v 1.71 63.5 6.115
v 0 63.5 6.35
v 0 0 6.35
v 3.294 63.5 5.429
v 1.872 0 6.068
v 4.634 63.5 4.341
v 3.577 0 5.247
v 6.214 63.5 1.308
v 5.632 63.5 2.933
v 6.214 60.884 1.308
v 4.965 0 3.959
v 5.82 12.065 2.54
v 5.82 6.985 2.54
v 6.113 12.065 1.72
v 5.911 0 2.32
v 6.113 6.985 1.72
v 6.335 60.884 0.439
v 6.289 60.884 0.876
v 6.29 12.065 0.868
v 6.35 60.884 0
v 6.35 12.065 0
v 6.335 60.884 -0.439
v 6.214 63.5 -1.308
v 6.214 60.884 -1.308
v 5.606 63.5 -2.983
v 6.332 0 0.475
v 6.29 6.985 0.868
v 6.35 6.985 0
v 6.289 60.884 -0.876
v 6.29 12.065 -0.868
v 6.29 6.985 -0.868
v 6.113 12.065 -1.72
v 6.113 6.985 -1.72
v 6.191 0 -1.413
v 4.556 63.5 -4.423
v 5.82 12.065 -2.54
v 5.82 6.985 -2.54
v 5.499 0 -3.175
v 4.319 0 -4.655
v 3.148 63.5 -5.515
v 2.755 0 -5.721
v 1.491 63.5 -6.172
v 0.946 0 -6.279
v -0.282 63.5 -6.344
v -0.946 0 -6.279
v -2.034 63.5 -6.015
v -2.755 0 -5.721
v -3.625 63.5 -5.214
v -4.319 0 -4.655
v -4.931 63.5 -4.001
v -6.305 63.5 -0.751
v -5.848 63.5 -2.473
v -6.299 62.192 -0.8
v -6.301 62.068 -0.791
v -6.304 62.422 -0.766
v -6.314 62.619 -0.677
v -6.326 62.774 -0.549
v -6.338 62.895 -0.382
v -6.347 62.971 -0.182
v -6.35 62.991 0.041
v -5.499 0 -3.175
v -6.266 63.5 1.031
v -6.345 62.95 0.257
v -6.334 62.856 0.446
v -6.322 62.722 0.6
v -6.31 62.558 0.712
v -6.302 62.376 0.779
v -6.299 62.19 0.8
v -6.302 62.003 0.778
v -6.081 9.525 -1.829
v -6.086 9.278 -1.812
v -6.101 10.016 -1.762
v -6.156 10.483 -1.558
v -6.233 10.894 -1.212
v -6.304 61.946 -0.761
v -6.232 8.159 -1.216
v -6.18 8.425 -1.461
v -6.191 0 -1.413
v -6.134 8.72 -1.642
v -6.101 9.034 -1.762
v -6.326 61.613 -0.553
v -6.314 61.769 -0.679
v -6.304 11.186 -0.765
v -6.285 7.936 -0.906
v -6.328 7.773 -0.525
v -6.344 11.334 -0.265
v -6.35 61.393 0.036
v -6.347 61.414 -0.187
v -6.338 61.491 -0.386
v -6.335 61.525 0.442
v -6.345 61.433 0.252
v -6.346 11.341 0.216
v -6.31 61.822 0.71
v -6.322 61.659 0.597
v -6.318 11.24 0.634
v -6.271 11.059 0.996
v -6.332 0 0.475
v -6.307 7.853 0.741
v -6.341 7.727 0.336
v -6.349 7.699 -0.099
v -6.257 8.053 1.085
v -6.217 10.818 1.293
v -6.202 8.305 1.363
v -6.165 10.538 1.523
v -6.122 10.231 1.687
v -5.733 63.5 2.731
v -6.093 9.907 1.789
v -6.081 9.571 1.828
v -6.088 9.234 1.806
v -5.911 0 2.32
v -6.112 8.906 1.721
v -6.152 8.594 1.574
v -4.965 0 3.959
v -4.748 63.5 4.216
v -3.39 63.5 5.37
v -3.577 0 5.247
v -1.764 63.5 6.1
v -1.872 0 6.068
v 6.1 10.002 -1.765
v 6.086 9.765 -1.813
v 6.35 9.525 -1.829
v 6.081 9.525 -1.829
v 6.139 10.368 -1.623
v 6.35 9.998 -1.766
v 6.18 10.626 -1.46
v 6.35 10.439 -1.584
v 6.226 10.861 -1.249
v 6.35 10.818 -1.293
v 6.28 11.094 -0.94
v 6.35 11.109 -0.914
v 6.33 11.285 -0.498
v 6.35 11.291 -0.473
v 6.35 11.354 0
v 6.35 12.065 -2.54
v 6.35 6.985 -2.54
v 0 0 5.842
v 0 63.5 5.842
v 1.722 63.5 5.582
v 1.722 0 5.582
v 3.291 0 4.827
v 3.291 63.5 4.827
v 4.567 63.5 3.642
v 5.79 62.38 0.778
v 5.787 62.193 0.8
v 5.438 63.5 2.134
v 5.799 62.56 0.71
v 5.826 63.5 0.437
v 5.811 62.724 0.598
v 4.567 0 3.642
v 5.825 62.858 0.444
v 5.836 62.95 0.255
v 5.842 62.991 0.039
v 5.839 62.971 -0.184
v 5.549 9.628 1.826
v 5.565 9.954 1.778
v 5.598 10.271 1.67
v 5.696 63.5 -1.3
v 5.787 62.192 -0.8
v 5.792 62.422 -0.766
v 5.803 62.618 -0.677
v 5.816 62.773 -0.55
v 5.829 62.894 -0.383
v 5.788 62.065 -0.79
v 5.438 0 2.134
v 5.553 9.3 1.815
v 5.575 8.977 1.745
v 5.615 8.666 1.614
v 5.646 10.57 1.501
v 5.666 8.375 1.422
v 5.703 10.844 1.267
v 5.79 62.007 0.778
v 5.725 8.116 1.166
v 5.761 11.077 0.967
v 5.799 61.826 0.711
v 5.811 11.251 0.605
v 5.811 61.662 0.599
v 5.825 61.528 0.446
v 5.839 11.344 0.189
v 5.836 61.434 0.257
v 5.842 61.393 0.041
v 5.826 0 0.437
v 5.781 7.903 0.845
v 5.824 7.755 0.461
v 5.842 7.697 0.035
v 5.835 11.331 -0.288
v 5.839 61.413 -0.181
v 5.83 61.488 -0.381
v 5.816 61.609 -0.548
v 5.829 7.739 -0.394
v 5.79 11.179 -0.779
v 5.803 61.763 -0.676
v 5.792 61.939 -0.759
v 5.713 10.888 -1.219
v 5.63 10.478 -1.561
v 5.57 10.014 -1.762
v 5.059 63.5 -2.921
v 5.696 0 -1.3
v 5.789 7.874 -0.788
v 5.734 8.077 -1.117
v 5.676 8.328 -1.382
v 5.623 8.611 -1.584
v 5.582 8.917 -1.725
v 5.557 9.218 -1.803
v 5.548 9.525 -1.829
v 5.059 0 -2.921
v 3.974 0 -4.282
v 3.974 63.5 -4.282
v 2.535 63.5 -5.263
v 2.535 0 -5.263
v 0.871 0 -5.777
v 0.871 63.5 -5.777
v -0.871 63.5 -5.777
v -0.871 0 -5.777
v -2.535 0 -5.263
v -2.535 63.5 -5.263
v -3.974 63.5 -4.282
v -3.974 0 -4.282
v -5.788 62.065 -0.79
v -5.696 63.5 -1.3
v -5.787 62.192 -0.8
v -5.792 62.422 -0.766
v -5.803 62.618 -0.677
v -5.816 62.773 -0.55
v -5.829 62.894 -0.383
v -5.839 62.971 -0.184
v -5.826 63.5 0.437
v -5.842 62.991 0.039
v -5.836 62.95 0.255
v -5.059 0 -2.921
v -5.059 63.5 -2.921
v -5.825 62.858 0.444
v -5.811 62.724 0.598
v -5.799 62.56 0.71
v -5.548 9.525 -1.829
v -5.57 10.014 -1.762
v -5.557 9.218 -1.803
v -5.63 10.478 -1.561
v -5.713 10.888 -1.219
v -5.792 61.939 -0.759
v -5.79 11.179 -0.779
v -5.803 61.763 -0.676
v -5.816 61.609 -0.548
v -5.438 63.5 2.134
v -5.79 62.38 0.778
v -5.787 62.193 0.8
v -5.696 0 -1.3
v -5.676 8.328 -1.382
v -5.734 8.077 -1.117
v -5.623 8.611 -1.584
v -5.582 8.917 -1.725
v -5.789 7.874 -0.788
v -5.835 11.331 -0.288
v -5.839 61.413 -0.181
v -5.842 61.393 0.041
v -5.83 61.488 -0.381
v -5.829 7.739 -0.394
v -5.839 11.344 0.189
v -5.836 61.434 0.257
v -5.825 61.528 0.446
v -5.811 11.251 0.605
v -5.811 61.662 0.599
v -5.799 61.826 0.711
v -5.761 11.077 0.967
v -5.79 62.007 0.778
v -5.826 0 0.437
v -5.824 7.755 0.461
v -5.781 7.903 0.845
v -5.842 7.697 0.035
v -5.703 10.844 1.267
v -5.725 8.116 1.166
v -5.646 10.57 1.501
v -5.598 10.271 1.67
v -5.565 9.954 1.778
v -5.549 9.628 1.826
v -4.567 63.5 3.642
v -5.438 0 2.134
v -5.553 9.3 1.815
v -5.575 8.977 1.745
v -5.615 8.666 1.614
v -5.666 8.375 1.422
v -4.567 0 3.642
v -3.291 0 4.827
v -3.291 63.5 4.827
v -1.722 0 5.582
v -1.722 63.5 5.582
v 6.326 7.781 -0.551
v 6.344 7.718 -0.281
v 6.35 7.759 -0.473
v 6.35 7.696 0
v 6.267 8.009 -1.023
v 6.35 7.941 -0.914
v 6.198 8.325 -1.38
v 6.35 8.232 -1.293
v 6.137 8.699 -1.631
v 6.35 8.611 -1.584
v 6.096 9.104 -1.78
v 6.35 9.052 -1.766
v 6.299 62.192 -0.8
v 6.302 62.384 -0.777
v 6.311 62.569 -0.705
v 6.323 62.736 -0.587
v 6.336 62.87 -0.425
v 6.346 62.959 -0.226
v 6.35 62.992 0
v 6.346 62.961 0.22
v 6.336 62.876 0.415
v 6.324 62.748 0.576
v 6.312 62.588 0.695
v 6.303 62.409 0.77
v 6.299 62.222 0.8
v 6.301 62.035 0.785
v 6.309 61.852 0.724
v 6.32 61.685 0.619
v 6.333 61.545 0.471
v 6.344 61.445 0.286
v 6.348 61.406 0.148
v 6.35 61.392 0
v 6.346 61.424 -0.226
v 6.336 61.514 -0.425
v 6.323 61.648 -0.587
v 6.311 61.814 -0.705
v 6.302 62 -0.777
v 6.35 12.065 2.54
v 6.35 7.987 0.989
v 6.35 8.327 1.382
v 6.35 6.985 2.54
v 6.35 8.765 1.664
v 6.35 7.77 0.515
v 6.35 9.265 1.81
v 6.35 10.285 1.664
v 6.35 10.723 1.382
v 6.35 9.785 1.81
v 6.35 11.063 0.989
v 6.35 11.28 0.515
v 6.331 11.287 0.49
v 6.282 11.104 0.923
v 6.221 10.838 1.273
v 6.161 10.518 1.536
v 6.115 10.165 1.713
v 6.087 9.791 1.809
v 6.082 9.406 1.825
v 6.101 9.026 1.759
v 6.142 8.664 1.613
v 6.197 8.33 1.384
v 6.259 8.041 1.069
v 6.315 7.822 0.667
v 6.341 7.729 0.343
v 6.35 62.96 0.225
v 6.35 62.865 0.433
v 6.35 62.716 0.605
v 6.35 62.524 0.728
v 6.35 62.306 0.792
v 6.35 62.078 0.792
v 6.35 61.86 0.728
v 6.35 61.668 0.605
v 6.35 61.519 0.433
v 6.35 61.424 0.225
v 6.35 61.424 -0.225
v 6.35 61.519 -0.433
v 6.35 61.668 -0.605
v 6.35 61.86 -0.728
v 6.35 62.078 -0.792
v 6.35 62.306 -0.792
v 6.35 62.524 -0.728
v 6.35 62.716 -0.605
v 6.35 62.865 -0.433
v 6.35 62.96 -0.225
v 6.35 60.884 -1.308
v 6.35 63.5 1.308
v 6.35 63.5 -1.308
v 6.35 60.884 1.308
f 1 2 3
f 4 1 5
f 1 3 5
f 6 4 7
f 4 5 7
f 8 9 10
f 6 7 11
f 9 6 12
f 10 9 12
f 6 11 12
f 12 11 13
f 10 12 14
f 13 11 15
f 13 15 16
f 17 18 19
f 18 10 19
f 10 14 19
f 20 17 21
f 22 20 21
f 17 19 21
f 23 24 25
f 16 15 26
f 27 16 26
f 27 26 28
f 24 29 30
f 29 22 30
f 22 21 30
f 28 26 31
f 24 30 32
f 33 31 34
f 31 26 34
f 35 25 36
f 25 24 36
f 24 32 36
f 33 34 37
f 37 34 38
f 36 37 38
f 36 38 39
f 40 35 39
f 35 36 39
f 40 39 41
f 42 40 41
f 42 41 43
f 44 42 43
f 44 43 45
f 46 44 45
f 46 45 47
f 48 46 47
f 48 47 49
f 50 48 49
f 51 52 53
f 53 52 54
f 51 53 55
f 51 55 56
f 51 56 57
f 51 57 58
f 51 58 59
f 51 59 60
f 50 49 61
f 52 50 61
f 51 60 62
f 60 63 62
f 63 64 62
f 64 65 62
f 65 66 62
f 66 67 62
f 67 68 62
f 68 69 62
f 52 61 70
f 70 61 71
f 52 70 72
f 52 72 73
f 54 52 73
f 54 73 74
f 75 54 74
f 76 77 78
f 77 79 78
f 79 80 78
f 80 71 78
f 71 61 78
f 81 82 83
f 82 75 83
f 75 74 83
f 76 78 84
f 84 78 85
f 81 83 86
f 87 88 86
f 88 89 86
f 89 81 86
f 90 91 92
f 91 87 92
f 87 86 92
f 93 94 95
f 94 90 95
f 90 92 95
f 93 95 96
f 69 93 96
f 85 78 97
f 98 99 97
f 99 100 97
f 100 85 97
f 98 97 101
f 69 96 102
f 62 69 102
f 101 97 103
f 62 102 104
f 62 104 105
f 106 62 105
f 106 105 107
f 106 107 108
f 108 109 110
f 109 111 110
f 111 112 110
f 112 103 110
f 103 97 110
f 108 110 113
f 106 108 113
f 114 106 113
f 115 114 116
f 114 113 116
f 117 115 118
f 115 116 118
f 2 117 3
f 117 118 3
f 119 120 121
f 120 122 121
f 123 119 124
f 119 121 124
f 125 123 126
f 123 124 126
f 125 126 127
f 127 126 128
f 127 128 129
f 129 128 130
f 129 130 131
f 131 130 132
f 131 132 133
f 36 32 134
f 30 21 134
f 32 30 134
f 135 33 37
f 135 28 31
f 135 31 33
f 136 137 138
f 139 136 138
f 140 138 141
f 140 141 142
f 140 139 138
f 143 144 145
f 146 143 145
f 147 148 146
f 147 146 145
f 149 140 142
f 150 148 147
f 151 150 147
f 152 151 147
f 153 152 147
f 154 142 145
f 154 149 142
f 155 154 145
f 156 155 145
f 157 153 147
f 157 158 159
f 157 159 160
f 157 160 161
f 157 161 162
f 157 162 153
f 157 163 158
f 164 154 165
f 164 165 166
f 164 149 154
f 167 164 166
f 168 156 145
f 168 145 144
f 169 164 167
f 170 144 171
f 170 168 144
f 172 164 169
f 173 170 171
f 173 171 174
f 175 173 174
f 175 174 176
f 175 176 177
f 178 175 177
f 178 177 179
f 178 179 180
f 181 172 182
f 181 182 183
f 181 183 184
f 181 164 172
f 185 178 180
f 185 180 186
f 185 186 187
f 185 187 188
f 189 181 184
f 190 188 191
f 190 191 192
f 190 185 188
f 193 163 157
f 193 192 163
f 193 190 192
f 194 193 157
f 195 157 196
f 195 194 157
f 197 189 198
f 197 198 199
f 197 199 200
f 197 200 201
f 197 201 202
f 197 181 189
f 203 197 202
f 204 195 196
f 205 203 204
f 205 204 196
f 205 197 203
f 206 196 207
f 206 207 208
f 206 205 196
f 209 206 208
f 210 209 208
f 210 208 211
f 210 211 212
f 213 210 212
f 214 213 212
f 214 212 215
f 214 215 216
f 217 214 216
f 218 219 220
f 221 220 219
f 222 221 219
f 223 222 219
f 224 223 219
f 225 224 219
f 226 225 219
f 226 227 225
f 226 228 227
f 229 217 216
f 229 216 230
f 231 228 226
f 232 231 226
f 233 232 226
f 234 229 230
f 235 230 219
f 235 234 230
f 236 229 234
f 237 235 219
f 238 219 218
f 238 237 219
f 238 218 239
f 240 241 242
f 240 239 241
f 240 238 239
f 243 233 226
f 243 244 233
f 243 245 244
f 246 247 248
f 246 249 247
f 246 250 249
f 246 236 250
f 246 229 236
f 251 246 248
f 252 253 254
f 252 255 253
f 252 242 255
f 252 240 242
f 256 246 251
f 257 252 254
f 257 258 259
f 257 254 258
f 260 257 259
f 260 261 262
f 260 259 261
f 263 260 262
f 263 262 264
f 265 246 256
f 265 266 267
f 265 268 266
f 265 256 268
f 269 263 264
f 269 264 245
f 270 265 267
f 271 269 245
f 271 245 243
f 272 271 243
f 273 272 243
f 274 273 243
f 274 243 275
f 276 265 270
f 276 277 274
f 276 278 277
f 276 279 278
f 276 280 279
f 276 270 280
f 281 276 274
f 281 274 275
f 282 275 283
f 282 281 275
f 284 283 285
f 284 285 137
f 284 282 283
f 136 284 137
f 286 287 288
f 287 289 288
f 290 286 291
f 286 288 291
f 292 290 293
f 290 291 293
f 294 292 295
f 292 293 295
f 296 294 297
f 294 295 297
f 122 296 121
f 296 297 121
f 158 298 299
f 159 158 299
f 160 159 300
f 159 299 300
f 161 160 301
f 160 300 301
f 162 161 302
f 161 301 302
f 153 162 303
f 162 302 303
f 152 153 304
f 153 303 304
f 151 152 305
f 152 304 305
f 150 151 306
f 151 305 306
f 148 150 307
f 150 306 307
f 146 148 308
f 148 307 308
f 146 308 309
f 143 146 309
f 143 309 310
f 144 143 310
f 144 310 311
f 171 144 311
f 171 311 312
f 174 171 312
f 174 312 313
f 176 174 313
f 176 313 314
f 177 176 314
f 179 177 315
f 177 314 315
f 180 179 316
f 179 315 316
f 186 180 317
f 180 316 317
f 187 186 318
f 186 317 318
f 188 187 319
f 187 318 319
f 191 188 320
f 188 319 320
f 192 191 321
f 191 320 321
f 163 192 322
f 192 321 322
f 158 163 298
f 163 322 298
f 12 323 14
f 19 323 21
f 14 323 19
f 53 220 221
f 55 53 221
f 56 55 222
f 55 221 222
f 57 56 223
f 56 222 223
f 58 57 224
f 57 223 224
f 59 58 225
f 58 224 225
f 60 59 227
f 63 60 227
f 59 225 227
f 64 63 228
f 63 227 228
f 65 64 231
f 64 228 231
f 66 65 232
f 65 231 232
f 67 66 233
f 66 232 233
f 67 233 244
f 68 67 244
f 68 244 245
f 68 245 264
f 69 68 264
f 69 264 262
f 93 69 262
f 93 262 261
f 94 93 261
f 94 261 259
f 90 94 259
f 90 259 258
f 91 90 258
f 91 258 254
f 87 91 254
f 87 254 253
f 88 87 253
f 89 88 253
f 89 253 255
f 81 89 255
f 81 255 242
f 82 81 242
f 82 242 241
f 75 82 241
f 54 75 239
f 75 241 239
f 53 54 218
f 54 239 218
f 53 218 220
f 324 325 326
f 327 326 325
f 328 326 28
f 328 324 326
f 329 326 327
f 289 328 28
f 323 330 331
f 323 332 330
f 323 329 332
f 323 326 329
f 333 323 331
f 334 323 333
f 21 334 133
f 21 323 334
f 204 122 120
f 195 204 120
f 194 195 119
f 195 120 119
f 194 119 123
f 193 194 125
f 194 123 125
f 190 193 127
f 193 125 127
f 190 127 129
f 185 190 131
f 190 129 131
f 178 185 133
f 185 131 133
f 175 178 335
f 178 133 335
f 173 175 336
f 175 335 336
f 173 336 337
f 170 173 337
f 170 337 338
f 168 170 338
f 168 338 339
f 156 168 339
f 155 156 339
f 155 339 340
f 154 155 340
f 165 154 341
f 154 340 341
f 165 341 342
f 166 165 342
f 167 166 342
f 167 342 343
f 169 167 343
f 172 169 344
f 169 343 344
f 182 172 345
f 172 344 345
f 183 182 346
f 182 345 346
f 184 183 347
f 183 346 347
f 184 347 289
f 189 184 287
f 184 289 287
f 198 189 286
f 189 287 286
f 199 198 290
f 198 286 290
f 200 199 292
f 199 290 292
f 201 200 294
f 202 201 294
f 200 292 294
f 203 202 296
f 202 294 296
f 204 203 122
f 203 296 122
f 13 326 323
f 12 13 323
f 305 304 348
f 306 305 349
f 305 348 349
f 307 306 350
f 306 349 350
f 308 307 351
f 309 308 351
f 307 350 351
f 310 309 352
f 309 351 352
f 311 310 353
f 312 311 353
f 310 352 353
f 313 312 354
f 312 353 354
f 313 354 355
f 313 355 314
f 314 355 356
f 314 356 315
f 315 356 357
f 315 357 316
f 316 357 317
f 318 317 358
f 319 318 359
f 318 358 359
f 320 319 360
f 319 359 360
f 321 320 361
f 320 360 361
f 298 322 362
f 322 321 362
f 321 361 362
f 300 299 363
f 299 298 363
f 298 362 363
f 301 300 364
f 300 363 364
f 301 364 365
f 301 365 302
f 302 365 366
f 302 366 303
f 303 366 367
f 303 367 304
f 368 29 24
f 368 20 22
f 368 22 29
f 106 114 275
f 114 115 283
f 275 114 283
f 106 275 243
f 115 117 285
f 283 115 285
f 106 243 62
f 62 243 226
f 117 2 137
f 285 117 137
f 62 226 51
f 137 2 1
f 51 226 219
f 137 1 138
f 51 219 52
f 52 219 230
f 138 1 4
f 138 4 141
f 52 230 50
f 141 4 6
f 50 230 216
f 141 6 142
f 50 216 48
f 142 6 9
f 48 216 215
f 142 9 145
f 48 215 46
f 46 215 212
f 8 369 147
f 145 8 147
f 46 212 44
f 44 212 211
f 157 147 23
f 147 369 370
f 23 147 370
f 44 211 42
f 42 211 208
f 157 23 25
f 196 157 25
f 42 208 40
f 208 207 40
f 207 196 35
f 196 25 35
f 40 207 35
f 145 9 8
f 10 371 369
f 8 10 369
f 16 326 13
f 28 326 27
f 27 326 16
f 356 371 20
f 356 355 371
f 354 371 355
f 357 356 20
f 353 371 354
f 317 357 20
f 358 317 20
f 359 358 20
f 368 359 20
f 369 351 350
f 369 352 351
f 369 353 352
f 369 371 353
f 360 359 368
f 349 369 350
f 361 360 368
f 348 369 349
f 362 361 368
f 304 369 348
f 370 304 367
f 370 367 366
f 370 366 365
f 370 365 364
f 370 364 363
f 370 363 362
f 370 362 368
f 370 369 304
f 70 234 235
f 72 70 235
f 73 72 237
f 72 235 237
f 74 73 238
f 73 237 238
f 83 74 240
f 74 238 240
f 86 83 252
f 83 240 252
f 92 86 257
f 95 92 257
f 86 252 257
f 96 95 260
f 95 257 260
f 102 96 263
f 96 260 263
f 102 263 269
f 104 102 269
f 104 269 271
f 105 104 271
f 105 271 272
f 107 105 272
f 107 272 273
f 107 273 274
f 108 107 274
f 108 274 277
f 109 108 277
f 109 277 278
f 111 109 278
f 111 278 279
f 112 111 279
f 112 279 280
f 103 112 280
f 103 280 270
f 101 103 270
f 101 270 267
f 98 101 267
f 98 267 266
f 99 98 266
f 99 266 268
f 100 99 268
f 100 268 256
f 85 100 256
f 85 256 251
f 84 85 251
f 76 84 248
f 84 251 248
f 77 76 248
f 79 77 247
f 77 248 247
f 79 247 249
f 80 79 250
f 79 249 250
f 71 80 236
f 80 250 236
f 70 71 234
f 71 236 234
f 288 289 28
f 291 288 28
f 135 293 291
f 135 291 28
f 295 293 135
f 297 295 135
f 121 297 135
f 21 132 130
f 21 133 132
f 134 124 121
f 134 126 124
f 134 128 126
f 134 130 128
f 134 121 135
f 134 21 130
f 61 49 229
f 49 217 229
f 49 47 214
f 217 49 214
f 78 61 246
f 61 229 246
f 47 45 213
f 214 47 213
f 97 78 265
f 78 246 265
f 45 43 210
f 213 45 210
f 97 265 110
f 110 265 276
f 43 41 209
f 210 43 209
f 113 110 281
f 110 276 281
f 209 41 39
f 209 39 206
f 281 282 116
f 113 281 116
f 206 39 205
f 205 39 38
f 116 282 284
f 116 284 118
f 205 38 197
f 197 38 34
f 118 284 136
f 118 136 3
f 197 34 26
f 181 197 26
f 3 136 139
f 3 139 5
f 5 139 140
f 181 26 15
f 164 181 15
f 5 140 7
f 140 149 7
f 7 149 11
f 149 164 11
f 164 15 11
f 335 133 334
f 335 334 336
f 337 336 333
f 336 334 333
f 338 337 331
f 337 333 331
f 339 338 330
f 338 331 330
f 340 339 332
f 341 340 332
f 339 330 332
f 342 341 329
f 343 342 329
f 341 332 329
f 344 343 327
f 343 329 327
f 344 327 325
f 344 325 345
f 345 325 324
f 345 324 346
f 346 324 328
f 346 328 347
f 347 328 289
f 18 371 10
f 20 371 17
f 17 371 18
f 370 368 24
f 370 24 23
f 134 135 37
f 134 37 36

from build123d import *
from build123d.topology import SkipClean

# Parameters (mm, degrees)
SKETCH1_R                = 6.35
SKETCH1_R_2              = 5.842
BOSS_EXTRUDE1_DEPTH      = 63.5
SKETCH2_R                = 0.8001
CUT_EXTRUDE1_DEPTH       = 66.068137364
BOSS_EXTRUDE2_REACH      = 67.068
BOSS_EXTRUDE2_END_RADIUS = 6.35
SKETCH3_W                = 2.6162
SKETCH3_H                = 2.6162
SKETCH3_R                = 0.8001
SKETCH4_R                = 1.8288
CUT_EXTRUDE2_DEPTH       = 66.068137491
BOSS_EXTRUDE3_REACH      = 67.068
BOSS_EXTRUDE3_END_RADIUS = 6.35
SKETCH5_W                = 5.08
SKETCH5_H                = 5.08
SKETCH5_R                = 1.8288


with BuildPart() as part:
    # Sketch1 → Boss-Extrude1 (new body)
    with BuildSketch(Plane(origin=(0, 0, 0), x_dir=(1, 0, 0), z_dir=(0, 1, 0))):
        with Locations(Location((0, 0, 0), (0, 0, 270))):
            Circle(SKETCH1_R)
        with Locations(Location((0, 0, 0), (0, 0, 270))):
            Circle(SKETCH1_R_2, mode=Mode.SUBTRACT)
    extrude(amount=BOSS_EXTRUDE1_DEPTH)

    # Sketch2 → Cut-Extrude1 (cut, through all)
    with BuildSketch(Plane(origin=(6.35, 0, 0), x_dir=(0, 0, -1), z_dir=(1, 0, 0))):
        with Locations((0, 62.1919)):
            Circle(SKETCH2_R)
    extrude(amount=-CUT_EXTRUDE1_DEPTH, mode=Mode.SUBTRACT)

    # Boss-Extrude2: up to this cylinder (the profile starts outside it)
    with SkipClean():  # the faces are left unmerged after this step: merging them gives an invalid solid
        boss_extrude2_end = Plane(origin=(0, 60.920799, 0), z_dir=(0, -1, 0)) * Cylinder(BOSS_EXTRUDE2_END_RADIUS, 147.836, mode=Mode.PRIVATE)
        # Sketch3 → Boss-Extrude2 (add, up to the surface)
        with BuildSketch(Plane(origin=(6.35, 0, 0), x_dir=(0, 0, -1), z_dir=(1, 0, 0)), mode=Mode.PRIVATE) as boss_extrude2_sk1:
            with Locations((0, 62.1919)):
                Rectangle(SKETCH3_W, SKETCH3_H)
            with Locations((0, 62.1919)):
                Circle(SKETCH3_R, mode=Mode.SUBTRACT)
        boss_extrude2_tool1 = extrude(boss_extrude2_sk1.sketch, amount=-BOSS_EXTRUDE2_REACH, mode=Mode.PRIVATE) - boss_extrude2_end
        add(boss_extrude2_tool1.solids().sort_by_distance((6.35, 60.920799, 0))[0])
        add(boss_extrude2_tool1.solids().sort_by_distance((6.35, 60.920799, 0))[1])

    # Sketch4 → Cut-Extrude2 (cut, through all)
    with BuildSketch(Plane(origin=(6.35, 0, 0), x_dir=(0, 0, -1), z_dir=(1, 0, 0))):
        with Locations((0, 9.525)):
            Circle(SKETCH4_R)
    extrude(amount=-CUT_EXTRUDE2_DEPTH, mode=Mode.SUBTRACT)

    # Boss-Extrude3: up to this cylinder (the profile starts outside it)
    with SkipClean():  # the faces are left unmerged after this step: merging them gives an invalid solid
        boss_extrude3_end = Plane(origin=(0, 7.056842, 0), z_dir=(0, -1, 0)) * Cylinder(BOSS_EXTRUDE3_END_RADIUS, 147.836, mode=Mode.PRIVATE)
        # Sketch5 → Boss-Extrude3 (add, up to the surface)
        with BuildSketch(Plane(origin=(6.35, 0, 0), x_dir=(0, 0, -1), z_dir=(1, 0, 0)), mode=Mode.PRIVATE) as boss_extrude3_sk1:
            with Locations((0, 9.525)):
                Rectangle(SKETCH5_W, SKETCH5_H)
            with Locations((0, 9.525)):
                Circle(SKETCH5_R, mode=Mode.SUBTRACT)
        boss_extrude3_tool1 = extrude(boss_extrude3_sk1.sketch, amount=-BOSS_EXTRUDE3_REACH, mode=Mode.PRIVATE) - boss_extrude3_end
        add(boss_extrude3_tool1.solids().sort_by_distance((6.35, 7.056842, 0))[0])
        add(boss_extrude3_tool1.solids().sort_by_distance((6.35, 7.056842, 0))[1])


solid = part.part
